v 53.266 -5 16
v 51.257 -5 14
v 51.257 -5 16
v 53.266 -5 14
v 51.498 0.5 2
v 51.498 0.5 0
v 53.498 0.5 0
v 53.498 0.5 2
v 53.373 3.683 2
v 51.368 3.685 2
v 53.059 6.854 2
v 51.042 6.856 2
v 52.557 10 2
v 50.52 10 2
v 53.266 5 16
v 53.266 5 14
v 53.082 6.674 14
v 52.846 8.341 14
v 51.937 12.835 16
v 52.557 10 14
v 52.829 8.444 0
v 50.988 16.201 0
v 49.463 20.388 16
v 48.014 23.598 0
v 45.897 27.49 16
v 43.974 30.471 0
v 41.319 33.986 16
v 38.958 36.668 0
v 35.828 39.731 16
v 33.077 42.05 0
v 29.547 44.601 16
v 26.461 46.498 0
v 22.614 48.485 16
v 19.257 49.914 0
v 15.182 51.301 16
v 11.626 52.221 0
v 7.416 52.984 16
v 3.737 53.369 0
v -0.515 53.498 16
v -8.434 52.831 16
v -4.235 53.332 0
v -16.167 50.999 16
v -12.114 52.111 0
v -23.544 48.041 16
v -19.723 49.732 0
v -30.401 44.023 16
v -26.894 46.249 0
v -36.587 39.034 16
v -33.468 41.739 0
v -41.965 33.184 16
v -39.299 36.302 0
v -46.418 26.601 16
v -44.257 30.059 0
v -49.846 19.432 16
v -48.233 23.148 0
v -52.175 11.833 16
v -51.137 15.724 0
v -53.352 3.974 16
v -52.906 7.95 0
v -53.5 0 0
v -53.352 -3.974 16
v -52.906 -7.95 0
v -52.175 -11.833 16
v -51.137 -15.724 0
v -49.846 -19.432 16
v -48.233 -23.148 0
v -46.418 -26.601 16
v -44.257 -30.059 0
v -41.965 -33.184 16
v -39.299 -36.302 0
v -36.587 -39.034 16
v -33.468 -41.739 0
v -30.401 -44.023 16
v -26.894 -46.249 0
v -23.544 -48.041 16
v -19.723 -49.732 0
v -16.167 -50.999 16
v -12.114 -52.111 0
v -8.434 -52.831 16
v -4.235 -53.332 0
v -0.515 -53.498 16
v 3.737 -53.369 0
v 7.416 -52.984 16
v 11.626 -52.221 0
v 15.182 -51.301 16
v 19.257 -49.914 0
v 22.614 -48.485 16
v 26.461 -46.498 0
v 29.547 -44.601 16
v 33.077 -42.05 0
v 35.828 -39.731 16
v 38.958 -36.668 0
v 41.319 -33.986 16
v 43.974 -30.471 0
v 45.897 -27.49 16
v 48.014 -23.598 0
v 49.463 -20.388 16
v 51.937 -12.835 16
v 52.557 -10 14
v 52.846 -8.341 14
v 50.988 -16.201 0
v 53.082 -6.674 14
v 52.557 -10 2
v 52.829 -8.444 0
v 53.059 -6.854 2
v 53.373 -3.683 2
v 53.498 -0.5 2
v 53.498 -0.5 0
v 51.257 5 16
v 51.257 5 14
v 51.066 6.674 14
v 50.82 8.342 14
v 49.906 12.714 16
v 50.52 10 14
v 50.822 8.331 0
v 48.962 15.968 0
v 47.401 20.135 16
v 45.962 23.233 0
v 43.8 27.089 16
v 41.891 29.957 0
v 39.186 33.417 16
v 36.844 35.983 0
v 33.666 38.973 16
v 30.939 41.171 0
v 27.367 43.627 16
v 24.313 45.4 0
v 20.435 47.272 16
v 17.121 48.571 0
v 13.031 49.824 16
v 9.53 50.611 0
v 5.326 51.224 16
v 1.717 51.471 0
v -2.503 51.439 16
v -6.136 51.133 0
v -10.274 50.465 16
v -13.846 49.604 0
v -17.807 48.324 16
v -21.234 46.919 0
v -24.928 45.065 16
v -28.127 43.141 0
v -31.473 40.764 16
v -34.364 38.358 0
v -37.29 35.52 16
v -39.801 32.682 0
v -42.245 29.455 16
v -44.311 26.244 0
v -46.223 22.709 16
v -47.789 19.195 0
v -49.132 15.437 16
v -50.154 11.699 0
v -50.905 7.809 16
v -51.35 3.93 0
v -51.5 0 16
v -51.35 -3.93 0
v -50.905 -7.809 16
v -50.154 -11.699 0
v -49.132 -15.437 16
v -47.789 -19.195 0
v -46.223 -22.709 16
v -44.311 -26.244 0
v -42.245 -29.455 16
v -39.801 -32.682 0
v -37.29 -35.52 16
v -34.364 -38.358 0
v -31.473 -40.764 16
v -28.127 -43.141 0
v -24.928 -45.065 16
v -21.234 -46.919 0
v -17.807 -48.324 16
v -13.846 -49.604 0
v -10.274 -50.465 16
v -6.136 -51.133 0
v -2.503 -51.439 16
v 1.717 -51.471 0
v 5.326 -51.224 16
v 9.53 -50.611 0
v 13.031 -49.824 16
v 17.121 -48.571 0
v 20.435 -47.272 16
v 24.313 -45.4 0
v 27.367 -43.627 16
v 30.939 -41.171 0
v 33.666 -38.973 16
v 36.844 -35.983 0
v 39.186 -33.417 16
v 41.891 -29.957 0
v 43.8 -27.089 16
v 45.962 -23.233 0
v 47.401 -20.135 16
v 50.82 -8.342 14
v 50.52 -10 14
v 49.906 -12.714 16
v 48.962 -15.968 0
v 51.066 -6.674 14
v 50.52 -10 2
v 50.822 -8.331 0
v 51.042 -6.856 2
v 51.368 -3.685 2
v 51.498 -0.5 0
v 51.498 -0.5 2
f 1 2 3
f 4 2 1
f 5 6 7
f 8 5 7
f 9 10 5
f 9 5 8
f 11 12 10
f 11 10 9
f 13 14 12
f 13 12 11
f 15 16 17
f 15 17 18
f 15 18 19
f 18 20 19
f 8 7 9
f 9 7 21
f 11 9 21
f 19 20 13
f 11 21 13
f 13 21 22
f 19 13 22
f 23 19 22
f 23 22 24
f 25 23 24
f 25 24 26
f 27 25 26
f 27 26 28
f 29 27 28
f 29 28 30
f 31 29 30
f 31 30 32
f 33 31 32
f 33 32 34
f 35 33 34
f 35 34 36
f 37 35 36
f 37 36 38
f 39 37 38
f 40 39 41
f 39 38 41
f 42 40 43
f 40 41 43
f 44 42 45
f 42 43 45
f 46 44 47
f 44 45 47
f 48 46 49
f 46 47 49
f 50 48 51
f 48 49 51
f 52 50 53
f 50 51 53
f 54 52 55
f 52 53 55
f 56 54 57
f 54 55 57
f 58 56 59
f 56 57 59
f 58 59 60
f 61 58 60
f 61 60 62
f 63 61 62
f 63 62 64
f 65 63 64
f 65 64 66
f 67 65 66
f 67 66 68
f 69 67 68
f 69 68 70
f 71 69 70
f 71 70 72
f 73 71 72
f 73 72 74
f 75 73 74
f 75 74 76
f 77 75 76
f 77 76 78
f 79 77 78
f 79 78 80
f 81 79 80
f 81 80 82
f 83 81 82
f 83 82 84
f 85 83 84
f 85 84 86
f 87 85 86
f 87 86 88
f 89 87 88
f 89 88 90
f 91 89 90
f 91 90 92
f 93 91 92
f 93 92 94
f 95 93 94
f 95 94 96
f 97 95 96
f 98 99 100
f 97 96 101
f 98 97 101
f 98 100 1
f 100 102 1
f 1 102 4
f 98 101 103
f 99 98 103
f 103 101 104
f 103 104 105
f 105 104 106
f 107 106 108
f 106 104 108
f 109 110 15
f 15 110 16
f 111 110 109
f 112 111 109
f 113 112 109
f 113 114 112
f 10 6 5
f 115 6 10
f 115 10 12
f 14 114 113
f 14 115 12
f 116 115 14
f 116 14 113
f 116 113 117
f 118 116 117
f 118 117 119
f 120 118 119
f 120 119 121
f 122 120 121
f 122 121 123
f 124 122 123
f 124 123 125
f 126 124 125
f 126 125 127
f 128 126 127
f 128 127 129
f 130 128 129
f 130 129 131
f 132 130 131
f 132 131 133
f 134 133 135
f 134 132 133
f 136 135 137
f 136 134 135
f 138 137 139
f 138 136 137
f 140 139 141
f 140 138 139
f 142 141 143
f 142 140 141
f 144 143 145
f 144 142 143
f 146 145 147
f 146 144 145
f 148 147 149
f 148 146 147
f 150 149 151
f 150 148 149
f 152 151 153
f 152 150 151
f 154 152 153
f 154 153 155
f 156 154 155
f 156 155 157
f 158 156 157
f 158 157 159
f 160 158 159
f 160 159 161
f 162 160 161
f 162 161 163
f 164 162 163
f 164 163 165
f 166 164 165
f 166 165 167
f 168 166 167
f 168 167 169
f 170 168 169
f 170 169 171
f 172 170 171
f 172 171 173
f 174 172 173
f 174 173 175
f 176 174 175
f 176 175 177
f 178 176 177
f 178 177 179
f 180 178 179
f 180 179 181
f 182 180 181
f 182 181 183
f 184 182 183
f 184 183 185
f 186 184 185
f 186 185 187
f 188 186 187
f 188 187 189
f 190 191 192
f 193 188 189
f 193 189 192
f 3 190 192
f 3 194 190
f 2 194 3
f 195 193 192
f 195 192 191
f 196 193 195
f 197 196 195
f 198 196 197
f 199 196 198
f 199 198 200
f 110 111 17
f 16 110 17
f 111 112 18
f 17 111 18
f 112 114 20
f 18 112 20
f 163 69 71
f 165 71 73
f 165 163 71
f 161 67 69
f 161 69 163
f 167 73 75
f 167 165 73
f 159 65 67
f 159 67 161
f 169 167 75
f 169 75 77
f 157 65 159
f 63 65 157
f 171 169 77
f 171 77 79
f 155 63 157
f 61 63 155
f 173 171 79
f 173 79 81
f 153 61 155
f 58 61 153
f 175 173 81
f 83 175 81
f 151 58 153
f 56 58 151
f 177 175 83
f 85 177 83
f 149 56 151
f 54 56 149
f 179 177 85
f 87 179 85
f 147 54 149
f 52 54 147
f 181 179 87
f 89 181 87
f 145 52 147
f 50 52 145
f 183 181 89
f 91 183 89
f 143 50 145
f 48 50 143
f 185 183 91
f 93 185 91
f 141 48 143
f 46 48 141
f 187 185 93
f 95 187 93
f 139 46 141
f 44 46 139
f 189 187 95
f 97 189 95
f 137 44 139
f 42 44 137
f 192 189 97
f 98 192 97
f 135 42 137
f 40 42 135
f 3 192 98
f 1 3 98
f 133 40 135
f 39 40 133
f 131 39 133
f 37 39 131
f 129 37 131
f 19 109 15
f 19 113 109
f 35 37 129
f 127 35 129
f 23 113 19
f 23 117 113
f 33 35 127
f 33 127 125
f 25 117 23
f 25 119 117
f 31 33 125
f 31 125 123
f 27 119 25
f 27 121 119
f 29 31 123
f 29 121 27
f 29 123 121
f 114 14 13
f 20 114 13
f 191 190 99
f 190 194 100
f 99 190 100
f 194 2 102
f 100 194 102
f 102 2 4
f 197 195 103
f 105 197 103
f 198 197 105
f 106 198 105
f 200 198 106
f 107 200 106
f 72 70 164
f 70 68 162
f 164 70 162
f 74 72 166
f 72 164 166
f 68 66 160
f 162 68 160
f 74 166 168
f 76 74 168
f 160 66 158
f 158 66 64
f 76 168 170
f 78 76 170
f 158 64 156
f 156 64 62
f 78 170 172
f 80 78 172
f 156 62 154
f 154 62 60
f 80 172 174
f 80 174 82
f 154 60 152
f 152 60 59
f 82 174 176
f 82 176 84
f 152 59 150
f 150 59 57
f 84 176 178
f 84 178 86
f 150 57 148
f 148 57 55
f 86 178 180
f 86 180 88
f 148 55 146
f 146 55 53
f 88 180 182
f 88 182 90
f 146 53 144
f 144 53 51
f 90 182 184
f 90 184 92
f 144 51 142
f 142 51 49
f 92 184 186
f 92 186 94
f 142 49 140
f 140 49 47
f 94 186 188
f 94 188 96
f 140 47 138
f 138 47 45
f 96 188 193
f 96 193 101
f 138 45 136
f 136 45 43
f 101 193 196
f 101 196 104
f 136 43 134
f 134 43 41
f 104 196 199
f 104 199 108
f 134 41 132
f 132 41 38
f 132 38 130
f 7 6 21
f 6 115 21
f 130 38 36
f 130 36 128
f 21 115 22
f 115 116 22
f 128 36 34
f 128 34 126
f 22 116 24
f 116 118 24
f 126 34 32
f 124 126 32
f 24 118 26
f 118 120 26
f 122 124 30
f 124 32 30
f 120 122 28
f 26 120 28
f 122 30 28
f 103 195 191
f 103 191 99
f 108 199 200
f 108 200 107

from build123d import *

# Parameters (mm, degrees)
BOX002_W          = 25
BOX002_H          = 10
BOX002_DEPTH      = 25.45
BOX010_W          = 25
BOX010_H          = 1
BOX010_DEPTH      = 25.45
BOX_W             = 25
BOX_H             = 20
BOX_DEPTH         = 12
CYLINDER_R        = 51.5
CYLINDER_DEPTH    = 16
CYLINDER001_R     = 53.5
CYLINDER001_DEPTH = 16


with BuildPart() as cube002:
    # Box002 → Box002 (new body)
    with BuildSketch(Plane(origin=(40, -5, 2.55), x_dir=(1, 0, 0), z_dir=(0, 0, 1))):
        with Locations((12.5, 5)):
            Rectangle(BOX002_W, BOX002_H)
    extrude(amount=BOX002_DEPTH)


with BuildPart() as cube010:
    # Box010 → Box010 (new body)
    with BuildSketch(Plane(origin=(45, -0.5, -3.45), x_dir=(1, 0, 0), z_dir=(0, 0, 1))):
        with Locations((12.5, 0.5)):
            Rectangle(BOX010_W, BOX010_H)
    extrude(amount=BOX010_DEPTH)


with BuildPart() as cortador002:
    # Box → Box (new body)
    with BuildSketch(Plane(origin=(40, -10, 2), x_dir=(1, 0, 0), z_dir=(0, 0, 1))):
        with Locations((12.5, 10)):
            Rectangle(BOX_W, BOX_H)
    extrude(amount=BOX_DEPTH)

    # Fusion: union Cube002, Cube010
    add(cube002.part)
    add(cube010.part)


with BuildPart() as cylinder_chico:
    # Cylinder → Cylinder (new body)
    with BuildSketch(Plane.XY):
        Circle(CYLINDER_R)
    extrude(amount=CYLINDER_DEPTH)


with BuildPart() as cut015021:
    # Cylinder001 → Cylinder001 (new body)
    with BuildSketch(Plane.XY):
        Circle(CYLINDER001_R)
    extrude(amount=CYLINDER001_DEPTH)

    # Cut: cut Cylinder_chico
    add(cylinder_chico.part, mode=Mode.SUBTRACT)

    # Cut015021: cut cortador002
    add(cortador002.part, mode=Mode.SUBTRACT)


solid = cut015021.part
